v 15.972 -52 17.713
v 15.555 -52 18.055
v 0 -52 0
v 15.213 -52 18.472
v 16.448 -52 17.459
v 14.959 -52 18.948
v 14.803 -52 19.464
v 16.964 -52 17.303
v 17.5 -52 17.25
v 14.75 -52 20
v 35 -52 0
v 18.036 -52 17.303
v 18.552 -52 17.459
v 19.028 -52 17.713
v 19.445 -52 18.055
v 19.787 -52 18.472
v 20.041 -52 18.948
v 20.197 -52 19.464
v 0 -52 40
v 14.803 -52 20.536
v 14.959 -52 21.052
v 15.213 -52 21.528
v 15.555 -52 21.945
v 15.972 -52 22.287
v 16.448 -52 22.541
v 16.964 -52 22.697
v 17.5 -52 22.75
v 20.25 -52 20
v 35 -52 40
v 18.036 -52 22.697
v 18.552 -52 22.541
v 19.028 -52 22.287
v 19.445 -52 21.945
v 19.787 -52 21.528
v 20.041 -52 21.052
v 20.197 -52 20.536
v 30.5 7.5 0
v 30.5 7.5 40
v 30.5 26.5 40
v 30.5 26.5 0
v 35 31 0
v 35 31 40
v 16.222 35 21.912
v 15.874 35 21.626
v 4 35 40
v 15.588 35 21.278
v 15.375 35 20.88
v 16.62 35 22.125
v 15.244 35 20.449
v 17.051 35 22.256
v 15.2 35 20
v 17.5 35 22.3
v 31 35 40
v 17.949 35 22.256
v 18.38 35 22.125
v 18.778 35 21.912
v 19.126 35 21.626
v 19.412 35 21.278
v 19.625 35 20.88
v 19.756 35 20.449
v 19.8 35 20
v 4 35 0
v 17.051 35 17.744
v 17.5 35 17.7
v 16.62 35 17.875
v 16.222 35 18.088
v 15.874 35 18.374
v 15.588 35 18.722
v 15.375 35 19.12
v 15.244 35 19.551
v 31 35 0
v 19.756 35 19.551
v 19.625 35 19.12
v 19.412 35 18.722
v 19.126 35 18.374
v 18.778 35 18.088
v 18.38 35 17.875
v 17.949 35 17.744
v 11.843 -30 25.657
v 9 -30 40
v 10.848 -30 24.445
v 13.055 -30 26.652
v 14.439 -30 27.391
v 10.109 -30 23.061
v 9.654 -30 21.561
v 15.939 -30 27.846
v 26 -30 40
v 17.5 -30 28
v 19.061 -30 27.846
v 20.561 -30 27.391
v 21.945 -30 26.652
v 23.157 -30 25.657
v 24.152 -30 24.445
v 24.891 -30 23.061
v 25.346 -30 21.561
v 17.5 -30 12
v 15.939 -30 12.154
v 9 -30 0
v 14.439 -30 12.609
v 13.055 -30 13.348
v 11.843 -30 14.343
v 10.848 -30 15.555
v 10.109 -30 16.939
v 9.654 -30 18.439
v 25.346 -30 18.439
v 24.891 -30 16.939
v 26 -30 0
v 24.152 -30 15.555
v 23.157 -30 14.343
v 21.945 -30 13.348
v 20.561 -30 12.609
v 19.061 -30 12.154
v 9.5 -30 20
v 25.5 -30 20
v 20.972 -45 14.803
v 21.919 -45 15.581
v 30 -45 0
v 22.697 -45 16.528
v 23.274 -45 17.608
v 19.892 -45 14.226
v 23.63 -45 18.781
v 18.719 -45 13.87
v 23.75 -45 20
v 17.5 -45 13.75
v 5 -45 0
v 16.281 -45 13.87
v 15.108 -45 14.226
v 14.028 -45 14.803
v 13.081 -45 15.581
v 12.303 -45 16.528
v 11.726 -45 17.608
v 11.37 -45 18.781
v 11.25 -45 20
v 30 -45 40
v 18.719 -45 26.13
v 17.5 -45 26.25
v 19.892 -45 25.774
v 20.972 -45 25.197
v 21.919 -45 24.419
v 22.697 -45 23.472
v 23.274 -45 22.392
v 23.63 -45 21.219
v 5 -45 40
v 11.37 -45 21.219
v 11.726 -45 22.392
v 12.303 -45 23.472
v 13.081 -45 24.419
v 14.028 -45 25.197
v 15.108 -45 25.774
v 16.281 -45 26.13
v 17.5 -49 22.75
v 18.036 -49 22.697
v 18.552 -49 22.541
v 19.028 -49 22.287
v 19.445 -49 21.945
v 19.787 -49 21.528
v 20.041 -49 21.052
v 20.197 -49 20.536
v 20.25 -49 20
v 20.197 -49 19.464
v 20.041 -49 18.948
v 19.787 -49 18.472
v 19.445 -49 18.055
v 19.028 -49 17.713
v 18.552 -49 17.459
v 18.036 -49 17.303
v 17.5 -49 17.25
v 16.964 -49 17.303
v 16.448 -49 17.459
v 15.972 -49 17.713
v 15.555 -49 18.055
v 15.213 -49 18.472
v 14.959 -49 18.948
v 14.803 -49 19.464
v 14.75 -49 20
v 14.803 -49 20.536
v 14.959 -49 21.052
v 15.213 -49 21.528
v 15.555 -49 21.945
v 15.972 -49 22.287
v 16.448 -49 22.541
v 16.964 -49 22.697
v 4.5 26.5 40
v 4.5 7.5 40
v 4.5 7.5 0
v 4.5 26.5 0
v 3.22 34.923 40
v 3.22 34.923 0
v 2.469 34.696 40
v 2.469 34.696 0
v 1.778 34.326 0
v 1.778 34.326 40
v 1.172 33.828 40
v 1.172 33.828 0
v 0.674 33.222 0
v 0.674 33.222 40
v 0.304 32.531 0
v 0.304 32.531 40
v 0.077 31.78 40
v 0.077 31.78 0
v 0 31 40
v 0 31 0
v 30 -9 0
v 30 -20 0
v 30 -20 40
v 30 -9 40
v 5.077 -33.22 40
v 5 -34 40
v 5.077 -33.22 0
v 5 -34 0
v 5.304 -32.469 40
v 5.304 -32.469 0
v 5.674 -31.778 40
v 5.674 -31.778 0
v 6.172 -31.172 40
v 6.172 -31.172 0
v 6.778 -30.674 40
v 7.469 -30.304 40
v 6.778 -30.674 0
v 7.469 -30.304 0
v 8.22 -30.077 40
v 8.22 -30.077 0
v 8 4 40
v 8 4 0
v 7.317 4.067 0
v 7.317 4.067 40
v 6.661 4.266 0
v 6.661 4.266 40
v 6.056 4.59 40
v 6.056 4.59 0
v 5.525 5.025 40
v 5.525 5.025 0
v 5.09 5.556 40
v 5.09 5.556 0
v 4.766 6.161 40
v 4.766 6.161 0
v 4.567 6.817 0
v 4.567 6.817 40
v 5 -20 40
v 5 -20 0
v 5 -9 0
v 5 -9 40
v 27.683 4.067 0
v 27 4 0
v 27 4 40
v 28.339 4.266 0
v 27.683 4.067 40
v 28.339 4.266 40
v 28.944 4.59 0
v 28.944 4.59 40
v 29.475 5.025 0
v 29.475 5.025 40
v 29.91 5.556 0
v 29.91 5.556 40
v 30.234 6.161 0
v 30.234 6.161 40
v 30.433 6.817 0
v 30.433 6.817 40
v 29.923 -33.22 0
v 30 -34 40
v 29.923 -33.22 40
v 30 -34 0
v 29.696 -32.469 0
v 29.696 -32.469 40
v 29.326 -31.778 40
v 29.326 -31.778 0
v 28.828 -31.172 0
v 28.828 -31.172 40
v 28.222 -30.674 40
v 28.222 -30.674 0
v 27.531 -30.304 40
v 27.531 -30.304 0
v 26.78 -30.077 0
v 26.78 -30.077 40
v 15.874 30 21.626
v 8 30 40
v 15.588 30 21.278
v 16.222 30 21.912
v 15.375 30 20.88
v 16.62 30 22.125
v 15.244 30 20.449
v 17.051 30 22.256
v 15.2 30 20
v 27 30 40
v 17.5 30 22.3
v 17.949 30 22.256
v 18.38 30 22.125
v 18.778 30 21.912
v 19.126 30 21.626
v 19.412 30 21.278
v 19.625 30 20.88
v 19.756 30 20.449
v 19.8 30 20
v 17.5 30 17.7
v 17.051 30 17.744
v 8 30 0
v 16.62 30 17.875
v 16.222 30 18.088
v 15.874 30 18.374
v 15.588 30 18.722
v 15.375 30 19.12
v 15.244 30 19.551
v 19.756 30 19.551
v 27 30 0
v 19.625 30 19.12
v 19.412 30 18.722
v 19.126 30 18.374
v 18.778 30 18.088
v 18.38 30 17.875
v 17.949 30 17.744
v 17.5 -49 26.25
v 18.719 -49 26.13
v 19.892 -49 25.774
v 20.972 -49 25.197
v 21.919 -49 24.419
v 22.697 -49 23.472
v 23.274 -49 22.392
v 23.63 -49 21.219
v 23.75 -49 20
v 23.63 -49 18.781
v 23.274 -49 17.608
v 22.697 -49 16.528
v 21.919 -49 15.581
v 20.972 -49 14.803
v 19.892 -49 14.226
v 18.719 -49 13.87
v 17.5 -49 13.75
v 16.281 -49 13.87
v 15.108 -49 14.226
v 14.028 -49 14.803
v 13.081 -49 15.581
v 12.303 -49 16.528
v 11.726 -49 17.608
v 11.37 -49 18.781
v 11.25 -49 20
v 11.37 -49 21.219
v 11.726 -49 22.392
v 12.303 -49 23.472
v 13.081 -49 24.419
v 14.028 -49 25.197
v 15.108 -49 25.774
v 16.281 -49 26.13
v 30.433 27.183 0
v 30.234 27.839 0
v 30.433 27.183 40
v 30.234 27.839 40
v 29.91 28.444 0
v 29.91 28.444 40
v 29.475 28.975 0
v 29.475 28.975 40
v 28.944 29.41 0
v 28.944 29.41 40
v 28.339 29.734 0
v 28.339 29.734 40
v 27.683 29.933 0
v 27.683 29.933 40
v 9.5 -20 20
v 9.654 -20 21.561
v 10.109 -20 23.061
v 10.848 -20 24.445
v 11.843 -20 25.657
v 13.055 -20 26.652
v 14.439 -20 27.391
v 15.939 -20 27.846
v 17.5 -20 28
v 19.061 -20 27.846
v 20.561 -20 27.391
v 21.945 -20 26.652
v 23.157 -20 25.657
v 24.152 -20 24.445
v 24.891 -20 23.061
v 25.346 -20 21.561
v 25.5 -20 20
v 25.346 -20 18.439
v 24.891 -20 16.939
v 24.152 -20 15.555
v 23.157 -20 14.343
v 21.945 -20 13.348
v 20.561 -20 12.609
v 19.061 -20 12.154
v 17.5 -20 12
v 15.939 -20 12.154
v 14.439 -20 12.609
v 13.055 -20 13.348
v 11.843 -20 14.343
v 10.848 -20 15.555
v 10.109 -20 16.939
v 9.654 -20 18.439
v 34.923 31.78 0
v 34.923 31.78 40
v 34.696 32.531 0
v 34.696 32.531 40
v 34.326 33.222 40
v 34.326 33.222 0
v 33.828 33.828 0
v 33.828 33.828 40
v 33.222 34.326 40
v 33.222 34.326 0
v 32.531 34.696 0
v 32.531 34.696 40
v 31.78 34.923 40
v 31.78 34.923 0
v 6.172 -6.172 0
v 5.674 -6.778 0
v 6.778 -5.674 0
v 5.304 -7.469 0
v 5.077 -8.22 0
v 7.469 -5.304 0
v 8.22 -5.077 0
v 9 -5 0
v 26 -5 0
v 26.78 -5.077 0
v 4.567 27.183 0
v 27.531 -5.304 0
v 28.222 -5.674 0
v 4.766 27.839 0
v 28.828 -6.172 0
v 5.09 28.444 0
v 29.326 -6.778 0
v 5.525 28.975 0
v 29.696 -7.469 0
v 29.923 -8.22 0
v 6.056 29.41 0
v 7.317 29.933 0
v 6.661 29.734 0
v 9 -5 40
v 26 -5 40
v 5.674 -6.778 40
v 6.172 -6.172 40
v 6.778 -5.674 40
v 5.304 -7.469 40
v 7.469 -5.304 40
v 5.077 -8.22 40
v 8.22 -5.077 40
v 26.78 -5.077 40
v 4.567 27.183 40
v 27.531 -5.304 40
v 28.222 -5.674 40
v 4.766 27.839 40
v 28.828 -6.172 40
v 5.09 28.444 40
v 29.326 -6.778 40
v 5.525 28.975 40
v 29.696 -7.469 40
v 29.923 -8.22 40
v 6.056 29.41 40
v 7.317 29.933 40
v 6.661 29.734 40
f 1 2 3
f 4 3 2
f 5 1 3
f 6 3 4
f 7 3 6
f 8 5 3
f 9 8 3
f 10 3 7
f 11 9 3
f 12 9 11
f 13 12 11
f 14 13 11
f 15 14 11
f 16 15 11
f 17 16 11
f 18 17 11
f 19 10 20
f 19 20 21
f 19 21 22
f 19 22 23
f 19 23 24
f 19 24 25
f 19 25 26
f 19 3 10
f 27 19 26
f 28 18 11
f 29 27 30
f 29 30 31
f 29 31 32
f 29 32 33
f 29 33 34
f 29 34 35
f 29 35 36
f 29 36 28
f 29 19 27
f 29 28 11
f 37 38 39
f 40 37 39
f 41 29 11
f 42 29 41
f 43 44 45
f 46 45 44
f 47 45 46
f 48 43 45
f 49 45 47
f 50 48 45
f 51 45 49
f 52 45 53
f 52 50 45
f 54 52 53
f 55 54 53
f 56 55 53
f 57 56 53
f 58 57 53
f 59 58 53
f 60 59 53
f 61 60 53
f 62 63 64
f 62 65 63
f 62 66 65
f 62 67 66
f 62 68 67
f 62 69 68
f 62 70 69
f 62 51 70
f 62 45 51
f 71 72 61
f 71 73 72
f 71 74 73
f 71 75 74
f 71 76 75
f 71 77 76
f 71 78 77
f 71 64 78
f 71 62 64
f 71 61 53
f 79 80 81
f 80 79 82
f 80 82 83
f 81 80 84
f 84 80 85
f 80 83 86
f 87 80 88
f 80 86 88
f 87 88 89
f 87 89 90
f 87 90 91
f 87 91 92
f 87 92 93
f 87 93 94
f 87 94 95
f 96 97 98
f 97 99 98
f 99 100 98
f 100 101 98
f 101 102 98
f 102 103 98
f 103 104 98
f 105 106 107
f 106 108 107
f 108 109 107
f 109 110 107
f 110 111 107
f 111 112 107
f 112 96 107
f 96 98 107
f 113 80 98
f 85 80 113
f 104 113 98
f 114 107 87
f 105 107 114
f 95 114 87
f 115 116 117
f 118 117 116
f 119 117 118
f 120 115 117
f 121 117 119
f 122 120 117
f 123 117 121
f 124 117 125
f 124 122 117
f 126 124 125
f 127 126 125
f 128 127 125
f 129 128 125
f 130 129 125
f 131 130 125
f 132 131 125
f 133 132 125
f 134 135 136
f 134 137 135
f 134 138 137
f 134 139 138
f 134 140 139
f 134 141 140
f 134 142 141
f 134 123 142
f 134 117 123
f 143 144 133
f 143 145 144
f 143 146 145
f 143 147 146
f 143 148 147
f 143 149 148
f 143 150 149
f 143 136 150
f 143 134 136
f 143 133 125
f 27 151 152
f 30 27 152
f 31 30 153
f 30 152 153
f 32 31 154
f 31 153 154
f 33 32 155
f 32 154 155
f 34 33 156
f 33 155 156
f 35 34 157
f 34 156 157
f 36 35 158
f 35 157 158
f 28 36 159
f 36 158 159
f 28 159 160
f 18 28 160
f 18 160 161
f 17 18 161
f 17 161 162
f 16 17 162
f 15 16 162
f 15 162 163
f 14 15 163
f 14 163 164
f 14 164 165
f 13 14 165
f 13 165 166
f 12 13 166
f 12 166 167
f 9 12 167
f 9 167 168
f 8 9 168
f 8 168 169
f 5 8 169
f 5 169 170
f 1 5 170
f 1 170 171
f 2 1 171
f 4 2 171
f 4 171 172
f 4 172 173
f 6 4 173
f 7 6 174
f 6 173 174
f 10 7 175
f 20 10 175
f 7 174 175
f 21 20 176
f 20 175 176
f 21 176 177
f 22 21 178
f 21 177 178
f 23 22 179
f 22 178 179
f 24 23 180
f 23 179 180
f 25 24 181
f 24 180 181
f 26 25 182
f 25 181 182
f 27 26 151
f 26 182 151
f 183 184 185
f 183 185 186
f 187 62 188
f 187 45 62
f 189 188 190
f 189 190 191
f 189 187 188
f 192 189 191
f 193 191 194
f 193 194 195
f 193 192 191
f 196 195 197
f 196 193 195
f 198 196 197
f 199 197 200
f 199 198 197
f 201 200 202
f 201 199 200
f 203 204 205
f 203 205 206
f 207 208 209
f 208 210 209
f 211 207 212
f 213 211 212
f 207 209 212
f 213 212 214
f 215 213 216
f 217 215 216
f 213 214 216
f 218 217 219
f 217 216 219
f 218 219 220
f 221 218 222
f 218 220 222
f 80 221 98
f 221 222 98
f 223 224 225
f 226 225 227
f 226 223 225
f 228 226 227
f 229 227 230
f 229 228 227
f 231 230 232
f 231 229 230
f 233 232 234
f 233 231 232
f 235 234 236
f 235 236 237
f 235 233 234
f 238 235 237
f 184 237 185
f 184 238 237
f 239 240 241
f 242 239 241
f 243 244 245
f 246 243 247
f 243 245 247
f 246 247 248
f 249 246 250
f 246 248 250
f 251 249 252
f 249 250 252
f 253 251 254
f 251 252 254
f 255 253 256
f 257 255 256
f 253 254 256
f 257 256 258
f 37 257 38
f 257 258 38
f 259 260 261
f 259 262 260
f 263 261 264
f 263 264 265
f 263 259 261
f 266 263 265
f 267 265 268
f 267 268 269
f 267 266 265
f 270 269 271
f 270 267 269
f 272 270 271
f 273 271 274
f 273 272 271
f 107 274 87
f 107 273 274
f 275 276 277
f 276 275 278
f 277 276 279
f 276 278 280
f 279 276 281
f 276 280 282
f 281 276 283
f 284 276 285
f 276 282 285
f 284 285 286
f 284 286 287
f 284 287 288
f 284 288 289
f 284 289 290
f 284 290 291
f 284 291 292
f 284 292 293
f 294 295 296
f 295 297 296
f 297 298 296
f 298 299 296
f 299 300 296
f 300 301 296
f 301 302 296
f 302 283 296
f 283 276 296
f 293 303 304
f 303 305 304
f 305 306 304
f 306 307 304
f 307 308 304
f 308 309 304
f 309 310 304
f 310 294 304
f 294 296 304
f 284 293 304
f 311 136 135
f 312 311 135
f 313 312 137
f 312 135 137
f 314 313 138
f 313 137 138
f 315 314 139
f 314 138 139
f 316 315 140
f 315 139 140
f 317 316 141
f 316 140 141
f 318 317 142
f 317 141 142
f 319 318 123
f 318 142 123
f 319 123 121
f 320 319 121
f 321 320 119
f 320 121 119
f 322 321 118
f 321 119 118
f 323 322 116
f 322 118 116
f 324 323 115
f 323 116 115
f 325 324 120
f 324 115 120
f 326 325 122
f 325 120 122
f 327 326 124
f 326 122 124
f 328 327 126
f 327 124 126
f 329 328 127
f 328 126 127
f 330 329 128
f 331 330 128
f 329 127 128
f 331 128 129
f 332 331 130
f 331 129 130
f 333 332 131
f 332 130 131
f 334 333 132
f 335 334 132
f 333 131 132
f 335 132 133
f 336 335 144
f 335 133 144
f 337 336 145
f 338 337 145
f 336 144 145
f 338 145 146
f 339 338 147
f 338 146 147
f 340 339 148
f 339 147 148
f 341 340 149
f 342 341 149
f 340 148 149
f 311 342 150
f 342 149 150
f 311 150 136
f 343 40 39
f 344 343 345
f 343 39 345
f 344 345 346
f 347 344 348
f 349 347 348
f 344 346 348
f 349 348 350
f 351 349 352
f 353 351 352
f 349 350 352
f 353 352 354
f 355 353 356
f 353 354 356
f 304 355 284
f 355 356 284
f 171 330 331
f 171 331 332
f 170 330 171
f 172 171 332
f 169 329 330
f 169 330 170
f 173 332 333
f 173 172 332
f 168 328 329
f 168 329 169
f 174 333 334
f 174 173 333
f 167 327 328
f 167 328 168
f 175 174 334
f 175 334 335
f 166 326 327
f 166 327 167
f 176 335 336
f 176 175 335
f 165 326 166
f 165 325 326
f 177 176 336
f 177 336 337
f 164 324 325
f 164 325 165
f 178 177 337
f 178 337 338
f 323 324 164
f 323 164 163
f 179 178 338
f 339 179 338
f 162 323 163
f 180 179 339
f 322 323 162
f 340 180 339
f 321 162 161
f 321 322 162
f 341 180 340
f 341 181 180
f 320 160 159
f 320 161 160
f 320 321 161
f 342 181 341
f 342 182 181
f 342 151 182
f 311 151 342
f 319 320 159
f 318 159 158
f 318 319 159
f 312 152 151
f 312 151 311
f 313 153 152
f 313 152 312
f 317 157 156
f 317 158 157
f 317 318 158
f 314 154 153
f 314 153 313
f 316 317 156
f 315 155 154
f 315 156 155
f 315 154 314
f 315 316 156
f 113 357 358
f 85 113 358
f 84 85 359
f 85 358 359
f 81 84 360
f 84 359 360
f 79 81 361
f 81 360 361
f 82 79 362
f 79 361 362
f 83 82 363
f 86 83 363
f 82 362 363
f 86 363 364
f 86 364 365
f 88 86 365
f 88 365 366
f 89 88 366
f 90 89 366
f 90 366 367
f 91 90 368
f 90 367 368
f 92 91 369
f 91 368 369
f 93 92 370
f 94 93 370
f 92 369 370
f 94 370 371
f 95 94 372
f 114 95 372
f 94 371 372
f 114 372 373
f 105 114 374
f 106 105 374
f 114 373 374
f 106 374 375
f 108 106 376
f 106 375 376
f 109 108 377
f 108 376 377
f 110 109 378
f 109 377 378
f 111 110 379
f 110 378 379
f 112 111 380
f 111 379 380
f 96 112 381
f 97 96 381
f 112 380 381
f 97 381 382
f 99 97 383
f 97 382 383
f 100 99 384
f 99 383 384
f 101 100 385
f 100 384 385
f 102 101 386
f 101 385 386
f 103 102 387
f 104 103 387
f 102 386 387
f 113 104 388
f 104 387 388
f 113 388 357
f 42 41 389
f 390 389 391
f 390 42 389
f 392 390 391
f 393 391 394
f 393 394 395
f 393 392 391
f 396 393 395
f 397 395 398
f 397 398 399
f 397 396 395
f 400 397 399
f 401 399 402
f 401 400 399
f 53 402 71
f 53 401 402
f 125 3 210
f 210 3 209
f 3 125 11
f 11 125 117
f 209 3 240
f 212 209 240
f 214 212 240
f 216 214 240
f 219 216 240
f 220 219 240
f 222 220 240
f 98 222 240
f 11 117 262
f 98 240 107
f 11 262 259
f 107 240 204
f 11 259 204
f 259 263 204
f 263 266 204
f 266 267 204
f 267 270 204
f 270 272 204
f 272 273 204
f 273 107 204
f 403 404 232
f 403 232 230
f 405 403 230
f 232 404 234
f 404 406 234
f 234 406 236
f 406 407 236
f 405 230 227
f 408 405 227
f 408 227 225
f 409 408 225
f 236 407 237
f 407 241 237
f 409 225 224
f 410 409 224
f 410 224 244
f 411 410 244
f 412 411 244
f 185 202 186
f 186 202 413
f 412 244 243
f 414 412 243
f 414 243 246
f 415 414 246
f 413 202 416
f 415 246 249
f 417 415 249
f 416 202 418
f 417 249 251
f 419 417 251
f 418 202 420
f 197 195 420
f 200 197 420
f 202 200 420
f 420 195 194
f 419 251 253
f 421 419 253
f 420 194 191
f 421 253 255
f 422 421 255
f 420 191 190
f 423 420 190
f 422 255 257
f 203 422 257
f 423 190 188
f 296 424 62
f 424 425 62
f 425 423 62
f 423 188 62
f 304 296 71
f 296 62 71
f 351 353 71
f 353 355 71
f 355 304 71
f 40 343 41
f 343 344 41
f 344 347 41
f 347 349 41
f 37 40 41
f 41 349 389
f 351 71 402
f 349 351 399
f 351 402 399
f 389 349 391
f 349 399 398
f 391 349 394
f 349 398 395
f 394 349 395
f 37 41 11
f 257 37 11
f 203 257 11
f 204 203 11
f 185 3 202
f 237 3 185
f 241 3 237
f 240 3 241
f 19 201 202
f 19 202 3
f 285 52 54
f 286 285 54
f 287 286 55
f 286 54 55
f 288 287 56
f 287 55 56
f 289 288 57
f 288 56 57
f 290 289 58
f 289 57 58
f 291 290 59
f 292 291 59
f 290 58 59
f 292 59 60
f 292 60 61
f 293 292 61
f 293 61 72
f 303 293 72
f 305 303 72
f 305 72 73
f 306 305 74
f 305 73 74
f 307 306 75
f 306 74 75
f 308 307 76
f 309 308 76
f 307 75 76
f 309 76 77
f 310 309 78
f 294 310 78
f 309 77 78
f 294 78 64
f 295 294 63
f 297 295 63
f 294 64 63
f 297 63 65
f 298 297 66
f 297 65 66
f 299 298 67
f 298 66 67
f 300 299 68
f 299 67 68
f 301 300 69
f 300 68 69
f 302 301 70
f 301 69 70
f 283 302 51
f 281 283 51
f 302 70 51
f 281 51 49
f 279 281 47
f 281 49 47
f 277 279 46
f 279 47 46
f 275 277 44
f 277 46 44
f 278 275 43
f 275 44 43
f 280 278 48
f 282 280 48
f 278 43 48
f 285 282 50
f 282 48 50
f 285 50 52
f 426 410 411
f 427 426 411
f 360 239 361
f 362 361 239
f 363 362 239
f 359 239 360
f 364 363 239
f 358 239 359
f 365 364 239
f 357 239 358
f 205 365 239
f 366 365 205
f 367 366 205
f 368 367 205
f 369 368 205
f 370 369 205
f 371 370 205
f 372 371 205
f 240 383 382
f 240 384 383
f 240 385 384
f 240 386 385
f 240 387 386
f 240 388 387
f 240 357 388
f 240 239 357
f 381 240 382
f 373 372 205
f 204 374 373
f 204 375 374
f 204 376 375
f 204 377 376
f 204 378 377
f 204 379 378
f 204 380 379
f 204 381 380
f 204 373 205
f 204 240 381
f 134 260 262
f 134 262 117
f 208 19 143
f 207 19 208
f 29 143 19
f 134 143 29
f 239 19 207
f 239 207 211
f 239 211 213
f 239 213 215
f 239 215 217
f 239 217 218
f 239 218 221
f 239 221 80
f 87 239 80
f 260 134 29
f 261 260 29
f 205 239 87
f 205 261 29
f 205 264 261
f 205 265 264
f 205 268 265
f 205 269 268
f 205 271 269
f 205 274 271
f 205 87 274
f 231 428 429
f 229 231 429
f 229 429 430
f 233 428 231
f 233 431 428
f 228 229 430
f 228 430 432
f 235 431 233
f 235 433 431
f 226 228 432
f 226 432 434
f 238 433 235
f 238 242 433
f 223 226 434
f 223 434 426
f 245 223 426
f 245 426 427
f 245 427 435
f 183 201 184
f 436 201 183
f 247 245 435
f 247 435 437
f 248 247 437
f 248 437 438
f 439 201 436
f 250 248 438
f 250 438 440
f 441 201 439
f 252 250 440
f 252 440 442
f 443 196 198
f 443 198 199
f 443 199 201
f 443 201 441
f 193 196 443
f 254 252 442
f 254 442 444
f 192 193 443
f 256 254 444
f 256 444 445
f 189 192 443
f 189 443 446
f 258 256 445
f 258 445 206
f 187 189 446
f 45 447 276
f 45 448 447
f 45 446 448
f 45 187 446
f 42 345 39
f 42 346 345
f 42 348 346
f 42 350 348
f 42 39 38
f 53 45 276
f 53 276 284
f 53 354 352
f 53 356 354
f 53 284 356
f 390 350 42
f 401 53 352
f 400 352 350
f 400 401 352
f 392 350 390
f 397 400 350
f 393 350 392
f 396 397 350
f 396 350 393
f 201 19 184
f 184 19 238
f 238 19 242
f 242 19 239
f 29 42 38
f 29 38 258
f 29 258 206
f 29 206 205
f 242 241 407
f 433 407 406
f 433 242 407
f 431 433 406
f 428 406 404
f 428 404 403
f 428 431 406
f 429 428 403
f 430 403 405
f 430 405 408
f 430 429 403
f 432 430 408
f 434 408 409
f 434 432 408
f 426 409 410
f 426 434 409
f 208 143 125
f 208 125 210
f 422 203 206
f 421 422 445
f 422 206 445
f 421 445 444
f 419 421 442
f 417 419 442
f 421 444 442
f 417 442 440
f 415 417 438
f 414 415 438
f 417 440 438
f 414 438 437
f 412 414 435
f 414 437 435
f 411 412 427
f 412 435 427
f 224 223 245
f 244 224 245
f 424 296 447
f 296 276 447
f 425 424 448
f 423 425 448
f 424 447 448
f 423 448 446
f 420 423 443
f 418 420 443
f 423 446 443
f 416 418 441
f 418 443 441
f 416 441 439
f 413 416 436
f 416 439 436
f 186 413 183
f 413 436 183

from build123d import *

# Parameters (mm, degrees)
SKETCH1_W           = 35
SKETCH1_H           = 35
SKETCH1_W_2         = 26
SKETCH1_H_2         = 26
SKETCH1_H_3         = 30
SKETCH1_W_3         = 25
SKETCH1_H_4         = 15
BOSS_EXTRUDE2_DEPTH = 40
FILLET3_R           = 3.5
FILLET4_R           = 4
SKETCH6_R           = 2.3
CUT_EXTRUDE5_DEPTH  = 5
BOSS_EXTRUDE3_DEPTH = 40
SKETCH7_R           = 8
CUT_EXTRUDE8_DEPTH  = 10
SKETCH11_R          = 6.25
CUT_EXTRUDE9_DEPTH  = 4
SKETCH12_R          = 2.75
CUT_EXTRUDE10_DEPTH = 97.046863561
FILLET5_R           = 4


with BuildPart() as part:
    # Sketch1 → Boss-Extrude2 (new body)
    # profile 1 of 2: a face of its own
    with BuildSketch(Plane.XY):
        with Locations((17.5, 17.5)):
            Rectangle(SKETCH1_W, SKETCH1_H)
        with Locations((17.5, 17)):
            Rectangle(SKETCH1_W_2, SKETCH1_H_2, mode=Mode.SUBTRACT)
    # profile 2 of 2: a face of its own
    with BuildSketch(Plane.XY):
        with Locations((17.5, -15)):
            Rectangle(SKETCH1_W, SKETCH1_H_3)
        with Locations((17.5, -12.5)):
            Rectangle(SKETCH1_W_3, SKETCH1_H_4, mode=Mode.SUBTRACT)
    extrude(amount=BOSS_EXTRUDE2_DEPTH)

    # Fillet3
    fillet3_edges = [part.edges().sort_by_distance(p)[0] for p in [
        (4.5, 30, 20),
        (4.5, 4, 20),
        (30.5, 4, 20),
        (30.5, 30, 20),
    ]]
    fillet(fillet3_edges, radius=FILLET3_R)

    # Fillet4
    fillet4_edges = [part.edges().sort_by_distance(p)[0] for p in [
        (0, 35, 20),
        (35, 35, 20),
    ]]
    fillet(fillet4_edges, radius=FILLET4_R)

    # Sketch6 → Cut-Extrude5 (cut)
    with BuildSketch(Plane(origin=(0, 35, 0), x_dir=(1, 0, 0), z_dir=(0, 1, 0))):
        with Locations(Location((17.5, -20, 0), (0, 0, 270))):
            Circle(SKETCH6_R)
    extrude(amount=-CUT_EXTRUDE5_DEPTH, mode=Mode.SUBTRACT)

    # Sketch9 → Boss-Extrude3 (add)
    with BuildSketch(Plane.XY.offset(40)):
        Polygon((5, -30), (0, -30), (0, -52), (35, -52), (35, -30), (30, -30), (30, -45), (5, -45), align=None)
    extrude(amount=-BOSS_EXTRUDE3_DEPTH)

    # Sketch7 → Cut-Extrude8 (cut)
    with BuildSketch(Plane(origin=(0, -20, 0), x_dir=(1, 0, 0), z_dir=(0, 1, 0))):
        with Locations(Location((17.5, -20, 0), (0, 0, 180))):
            Circle(SKETCH7_R)
    extrude(amount=-CUT_EXTRUDE8_DEPTH, mode=Mode.SUBTRACT)

    # Sketch11 → Cut-Extrude9 (cut)
    with BuildSketch(Plane(origin=(0, -45, 0), x_dir=(1, 0, 0), z_dir=(0, 1, 0))):
        with Locations(Location((17.5, -20, 0), (0, 0, 270))):
            Circle(SKETCH11_R)
    extrude(amount=-CUT_EXTRUDE9_DEPTH, mode=Mode.SUBTRACT)

    # Sketch12 → Cut-Extrude10 (cut, through all)
    with BuildSketch(Plane(origin=(0, -45, 0), x_dir=(1, 0, 0), z_dir=(0, 1, 0))):
        with Locations(Location((17.5, -20, 0), (0, 0, 270))):
            Circle(SKETCH12_R)
    extrude(amount=-CUT_EXTRUDE10_DEPTH, mode=Mode.SUBTRACT)

    # Fillet5
    fillet5_edges = [part.edges().sort_by_distance(p)[0] for p in [
        (30, -5, 20),
        (5, -5, 20),
        (30, -30, 20),
        (5, -30, 20),
    ]]
    fillet(fillet5_edges, radius=FILLET5_R)


solid = part.part
